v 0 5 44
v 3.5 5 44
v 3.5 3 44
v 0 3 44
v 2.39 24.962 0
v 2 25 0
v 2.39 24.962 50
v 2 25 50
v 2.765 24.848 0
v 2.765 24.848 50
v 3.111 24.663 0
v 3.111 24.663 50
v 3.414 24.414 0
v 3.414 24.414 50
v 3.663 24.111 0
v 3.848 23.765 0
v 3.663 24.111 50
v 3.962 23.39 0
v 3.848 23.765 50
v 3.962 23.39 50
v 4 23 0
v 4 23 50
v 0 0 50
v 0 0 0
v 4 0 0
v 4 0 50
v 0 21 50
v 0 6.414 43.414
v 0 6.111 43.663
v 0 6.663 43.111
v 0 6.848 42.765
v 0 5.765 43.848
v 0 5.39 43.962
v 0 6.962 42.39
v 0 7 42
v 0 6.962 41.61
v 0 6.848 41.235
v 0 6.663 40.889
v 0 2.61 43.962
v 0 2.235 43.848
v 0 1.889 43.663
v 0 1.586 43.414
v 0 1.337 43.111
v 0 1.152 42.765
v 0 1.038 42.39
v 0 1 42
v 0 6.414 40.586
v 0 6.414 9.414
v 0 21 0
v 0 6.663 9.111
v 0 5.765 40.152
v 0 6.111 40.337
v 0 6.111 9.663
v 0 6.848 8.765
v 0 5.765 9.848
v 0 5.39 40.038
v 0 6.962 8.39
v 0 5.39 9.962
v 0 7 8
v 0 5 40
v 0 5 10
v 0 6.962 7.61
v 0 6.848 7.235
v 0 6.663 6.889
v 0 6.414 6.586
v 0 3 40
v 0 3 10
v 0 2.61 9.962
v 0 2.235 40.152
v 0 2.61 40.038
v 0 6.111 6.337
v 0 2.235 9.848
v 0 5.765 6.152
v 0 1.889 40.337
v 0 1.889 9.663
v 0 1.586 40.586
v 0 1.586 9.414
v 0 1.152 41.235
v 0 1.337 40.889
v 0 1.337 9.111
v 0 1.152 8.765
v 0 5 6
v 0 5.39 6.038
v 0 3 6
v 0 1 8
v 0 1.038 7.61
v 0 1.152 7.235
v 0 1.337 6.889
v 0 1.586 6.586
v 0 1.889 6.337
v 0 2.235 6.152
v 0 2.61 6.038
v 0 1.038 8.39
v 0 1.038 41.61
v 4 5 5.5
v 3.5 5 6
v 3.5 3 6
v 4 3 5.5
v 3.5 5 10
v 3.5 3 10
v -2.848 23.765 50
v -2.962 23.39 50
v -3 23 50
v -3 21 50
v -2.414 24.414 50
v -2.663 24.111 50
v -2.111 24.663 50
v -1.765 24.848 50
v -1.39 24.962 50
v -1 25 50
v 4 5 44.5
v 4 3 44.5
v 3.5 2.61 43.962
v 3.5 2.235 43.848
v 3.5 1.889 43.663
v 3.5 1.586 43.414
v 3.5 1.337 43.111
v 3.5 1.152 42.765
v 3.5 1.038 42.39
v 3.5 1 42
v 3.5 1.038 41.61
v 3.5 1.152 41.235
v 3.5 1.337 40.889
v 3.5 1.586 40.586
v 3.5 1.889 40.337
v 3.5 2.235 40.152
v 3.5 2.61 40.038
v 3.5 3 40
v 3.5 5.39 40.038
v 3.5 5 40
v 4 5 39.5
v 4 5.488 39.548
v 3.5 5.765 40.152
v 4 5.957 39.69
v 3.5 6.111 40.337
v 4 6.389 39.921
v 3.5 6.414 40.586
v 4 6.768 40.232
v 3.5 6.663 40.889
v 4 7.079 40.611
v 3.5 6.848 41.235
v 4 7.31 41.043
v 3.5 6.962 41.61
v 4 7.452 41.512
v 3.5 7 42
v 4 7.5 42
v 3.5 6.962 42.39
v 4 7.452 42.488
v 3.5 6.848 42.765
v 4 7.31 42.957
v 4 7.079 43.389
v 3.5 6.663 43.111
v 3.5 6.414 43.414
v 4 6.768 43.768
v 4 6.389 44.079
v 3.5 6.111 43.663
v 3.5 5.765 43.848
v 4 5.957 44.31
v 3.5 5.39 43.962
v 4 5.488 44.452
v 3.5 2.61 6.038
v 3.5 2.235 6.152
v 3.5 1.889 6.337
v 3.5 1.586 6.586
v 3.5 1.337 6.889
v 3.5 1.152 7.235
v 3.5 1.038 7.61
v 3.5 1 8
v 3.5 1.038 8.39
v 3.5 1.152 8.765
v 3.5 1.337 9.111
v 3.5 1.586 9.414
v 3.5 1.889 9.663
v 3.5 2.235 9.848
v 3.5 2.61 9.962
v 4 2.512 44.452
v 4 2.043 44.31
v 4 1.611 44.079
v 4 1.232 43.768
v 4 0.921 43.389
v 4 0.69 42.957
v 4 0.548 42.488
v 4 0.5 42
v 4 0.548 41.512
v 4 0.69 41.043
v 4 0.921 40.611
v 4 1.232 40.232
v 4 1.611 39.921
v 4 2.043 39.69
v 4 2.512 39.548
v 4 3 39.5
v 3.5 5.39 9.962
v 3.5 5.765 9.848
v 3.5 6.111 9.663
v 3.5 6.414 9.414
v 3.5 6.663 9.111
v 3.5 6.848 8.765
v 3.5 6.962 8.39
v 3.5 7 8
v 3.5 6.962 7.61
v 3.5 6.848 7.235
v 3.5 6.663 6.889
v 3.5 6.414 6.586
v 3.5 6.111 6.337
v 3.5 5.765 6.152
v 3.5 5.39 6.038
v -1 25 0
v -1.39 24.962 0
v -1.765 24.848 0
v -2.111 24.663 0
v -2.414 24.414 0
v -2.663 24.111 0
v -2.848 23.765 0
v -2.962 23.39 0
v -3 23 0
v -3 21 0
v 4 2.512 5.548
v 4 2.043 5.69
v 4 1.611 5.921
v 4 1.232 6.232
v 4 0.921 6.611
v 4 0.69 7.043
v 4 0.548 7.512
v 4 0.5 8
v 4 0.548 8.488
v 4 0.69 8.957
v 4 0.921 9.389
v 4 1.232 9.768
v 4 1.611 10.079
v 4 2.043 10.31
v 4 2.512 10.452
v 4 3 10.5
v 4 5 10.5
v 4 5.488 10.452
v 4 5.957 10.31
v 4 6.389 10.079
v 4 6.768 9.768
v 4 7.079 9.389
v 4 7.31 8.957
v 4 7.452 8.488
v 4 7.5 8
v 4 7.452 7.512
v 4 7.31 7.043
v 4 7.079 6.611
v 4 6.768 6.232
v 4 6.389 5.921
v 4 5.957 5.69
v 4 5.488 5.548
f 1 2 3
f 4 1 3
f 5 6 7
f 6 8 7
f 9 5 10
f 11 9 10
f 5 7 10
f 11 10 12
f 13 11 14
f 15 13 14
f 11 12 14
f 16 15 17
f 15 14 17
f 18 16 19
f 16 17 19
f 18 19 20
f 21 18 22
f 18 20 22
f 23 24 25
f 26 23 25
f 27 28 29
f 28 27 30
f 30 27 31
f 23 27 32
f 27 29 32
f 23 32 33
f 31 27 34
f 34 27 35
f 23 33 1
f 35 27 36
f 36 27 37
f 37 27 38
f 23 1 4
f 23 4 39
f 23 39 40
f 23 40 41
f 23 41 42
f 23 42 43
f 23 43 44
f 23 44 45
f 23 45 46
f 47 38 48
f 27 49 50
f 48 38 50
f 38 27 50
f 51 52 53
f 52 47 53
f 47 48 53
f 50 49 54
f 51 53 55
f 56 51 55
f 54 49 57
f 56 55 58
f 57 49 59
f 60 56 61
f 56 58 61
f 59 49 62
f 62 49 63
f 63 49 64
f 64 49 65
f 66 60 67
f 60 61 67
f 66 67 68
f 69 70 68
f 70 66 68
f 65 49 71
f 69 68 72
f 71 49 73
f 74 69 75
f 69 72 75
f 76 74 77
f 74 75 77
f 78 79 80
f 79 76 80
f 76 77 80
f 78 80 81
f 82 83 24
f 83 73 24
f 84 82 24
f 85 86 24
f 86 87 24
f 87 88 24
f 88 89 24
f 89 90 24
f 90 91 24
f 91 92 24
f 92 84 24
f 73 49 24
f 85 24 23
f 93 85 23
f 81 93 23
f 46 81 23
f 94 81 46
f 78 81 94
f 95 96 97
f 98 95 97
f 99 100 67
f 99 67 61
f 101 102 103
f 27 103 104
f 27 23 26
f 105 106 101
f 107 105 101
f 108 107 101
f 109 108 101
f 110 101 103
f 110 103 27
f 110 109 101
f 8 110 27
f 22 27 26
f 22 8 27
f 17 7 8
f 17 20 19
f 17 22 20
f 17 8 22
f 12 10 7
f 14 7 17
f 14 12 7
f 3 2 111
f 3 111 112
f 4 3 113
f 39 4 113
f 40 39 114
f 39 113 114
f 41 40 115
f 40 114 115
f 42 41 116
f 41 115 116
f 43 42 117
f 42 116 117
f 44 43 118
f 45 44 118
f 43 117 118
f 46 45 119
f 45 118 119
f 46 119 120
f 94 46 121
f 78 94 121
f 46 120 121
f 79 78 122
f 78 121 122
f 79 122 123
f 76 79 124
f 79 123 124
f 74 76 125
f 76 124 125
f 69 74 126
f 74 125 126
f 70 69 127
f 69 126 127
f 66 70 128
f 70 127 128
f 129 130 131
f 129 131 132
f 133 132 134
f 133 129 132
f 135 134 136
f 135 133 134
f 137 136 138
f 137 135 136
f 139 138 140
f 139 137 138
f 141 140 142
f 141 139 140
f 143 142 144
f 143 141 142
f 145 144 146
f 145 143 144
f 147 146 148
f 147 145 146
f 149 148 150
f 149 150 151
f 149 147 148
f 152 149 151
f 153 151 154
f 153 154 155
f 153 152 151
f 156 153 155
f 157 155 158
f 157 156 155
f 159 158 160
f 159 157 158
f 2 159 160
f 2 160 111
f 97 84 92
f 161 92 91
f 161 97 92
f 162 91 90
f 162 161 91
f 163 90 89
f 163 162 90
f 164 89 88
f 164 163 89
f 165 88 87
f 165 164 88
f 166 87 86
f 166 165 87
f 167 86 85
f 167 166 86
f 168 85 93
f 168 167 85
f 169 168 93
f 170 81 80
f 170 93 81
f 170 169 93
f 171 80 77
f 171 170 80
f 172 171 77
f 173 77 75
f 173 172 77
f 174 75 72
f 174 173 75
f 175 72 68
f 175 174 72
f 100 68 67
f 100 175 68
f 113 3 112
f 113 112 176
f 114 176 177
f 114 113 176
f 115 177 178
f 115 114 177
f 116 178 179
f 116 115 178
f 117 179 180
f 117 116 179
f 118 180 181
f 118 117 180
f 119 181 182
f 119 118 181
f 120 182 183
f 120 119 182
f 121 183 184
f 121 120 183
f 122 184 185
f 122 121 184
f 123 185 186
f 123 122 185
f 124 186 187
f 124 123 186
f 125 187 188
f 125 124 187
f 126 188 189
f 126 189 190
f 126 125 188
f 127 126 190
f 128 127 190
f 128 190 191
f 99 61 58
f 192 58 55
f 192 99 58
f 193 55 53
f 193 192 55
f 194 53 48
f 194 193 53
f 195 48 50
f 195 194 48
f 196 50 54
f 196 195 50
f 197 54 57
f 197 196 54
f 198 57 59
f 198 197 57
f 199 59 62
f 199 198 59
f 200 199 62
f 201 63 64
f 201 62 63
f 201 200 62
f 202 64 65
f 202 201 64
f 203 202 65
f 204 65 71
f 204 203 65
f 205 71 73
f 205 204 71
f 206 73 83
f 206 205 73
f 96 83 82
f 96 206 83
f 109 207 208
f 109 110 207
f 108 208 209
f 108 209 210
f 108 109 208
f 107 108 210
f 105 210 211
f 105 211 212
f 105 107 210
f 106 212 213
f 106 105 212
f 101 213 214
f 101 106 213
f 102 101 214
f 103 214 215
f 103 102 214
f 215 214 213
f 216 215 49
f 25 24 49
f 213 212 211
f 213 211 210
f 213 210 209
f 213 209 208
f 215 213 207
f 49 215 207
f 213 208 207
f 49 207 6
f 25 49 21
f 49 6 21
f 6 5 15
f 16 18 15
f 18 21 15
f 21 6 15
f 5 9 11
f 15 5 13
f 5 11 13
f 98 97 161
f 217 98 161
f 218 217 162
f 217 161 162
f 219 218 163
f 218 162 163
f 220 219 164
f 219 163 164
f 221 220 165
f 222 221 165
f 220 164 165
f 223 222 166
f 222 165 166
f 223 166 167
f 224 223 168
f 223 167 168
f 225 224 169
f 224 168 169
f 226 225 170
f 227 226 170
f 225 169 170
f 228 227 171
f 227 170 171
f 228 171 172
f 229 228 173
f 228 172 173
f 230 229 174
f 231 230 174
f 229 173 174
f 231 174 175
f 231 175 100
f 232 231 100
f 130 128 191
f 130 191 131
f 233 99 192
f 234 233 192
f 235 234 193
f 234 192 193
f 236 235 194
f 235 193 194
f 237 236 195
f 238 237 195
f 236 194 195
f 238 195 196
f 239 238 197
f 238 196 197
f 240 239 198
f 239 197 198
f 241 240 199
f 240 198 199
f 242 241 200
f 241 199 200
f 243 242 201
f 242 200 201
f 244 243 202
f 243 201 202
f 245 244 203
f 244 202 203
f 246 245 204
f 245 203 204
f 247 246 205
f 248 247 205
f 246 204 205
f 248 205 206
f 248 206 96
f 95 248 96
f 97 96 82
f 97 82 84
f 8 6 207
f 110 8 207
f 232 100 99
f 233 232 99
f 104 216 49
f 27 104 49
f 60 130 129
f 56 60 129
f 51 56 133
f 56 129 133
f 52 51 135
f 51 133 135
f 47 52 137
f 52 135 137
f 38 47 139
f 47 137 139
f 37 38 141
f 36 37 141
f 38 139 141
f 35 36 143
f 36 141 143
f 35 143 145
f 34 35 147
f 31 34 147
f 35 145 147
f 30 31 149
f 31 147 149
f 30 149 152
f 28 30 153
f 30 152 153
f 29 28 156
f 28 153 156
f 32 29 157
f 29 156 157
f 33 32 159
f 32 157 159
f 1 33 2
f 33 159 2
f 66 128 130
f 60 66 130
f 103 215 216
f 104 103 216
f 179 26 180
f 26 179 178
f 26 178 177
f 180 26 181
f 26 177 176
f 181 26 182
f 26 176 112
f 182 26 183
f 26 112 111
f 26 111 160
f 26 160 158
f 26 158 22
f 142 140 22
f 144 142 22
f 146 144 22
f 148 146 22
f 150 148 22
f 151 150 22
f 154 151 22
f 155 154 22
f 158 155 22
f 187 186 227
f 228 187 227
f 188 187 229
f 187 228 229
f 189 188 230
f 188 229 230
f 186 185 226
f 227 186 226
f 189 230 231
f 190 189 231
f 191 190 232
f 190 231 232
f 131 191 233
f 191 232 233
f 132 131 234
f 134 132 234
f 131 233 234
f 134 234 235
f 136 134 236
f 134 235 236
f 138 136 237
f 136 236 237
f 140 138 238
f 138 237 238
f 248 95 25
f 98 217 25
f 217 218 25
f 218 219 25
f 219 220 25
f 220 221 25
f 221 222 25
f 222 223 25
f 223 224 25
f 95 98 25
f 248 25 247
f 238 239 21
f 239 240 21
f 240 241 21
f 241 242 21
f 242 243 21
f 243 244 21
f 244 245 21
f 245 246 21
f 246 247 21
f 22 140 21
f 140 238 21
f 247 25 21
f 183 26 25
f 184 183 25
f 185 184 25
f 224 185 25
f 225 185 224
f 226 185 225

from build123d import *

# Parameters (mm, degrees)
BOSS_EXTRUDE1_DEPTH = 50
FILLET1_R           = 2
CUT_EXTRUDE1_REACH  = 58.338
CHAMFER1_SIZE       = 0.5


with BuildPart() as part:
    # Sketch1 → Boss-Extrude1 (new body)
    with BuildSketch(Plane.XY):
        Polygon((4, 25), (-3, 25), (-3, 21), (0, 21), (0, 0), (4, 0), align=None)
    extrude(amount=BOSS_EXTRUDE1_DEPTH)

    # Fillet1
    fillet1_edges = [part.edges().sort_by_distance(p)[0] for p in [
        (-3, 25, 25),
        (4, 25, 25),
    ]]
    fillet(fillet1_edges, radius=FILLET1_R)

    # Sketch2 → Cut-Extrude1 (cut, up to next)
    with BuildSketch(Plane(origin=(4, 0, 0), x_dir=(0, 0, -1), z_dir=(1, 0, 0)), mode=Mode.PRIVATE) as cut_extrude1_sk1:
        with BuildLine():
            Line((-40, 3), (-40, 5))
            ThreePointArc((-40, 5), (-42, 7), (-44, 5))
            Line((-44, 5), (-44, 3))
            ThreePointArc((-44, 3), (-42, 1), (-40, 3))
        make_face()
    cut_extrude1_tool1 = extrude(cut_extrude1_sk1.sketch, amount=-CUT_EXTRUDE1_REACH, mode=Mode.PRIVATE) & part.part
    # Sketch2 → Cut-Extrude1 (cut, up to next)
    with BuildSketch(Plane(origin=(4, 0, 0), x_dir=(0, 0, -1), z_dir=(1, 0, 0)), mode=Mode.PRIVATE) as cut_extrude1_sk2:
        with BuildLine():
            ThreePointArc((-10, 5), (-8, 7), (-6, 5))
            Line((-6, 5), (-6, 3))
            ThreePointArc((-6, 3), (-8, 1), (-10, 3))
            Line((-10, 3), (-10, 5))
        make_face()
    cut_extrude1_tool2 = extrude(cut_extrude1_sk2.sketch, amount=-CUT_EXTRUDE1_REACH, mode=Mode.PRIVATE) & part.part
    add(cut_extrude1_tool1.solids().sort_by_distance((4, 4, 42))[0], mode=Mode.SUBTRACT)
    add(cut_extrude1_tool2.solids().sort_by_distance((4, 4, 8))[0], mode=Mode.SUBTRACT)

    # Chamfer1
    chamfer1_edges = [part.edges().sort_by_distance(p)[0] for p in [
        (4, 4, 44),
        (4, 4, 40),
        (4, 7, 42),
        (4, 1, 42),
        (4, 7, 8),
        (4, 1, 8),
        (4, 4, 10),
        (4, 4, 6),
    ]]
    chamfer(chamfer1_edges, length=CHAMFER1_SIZE)


solid = part.part
